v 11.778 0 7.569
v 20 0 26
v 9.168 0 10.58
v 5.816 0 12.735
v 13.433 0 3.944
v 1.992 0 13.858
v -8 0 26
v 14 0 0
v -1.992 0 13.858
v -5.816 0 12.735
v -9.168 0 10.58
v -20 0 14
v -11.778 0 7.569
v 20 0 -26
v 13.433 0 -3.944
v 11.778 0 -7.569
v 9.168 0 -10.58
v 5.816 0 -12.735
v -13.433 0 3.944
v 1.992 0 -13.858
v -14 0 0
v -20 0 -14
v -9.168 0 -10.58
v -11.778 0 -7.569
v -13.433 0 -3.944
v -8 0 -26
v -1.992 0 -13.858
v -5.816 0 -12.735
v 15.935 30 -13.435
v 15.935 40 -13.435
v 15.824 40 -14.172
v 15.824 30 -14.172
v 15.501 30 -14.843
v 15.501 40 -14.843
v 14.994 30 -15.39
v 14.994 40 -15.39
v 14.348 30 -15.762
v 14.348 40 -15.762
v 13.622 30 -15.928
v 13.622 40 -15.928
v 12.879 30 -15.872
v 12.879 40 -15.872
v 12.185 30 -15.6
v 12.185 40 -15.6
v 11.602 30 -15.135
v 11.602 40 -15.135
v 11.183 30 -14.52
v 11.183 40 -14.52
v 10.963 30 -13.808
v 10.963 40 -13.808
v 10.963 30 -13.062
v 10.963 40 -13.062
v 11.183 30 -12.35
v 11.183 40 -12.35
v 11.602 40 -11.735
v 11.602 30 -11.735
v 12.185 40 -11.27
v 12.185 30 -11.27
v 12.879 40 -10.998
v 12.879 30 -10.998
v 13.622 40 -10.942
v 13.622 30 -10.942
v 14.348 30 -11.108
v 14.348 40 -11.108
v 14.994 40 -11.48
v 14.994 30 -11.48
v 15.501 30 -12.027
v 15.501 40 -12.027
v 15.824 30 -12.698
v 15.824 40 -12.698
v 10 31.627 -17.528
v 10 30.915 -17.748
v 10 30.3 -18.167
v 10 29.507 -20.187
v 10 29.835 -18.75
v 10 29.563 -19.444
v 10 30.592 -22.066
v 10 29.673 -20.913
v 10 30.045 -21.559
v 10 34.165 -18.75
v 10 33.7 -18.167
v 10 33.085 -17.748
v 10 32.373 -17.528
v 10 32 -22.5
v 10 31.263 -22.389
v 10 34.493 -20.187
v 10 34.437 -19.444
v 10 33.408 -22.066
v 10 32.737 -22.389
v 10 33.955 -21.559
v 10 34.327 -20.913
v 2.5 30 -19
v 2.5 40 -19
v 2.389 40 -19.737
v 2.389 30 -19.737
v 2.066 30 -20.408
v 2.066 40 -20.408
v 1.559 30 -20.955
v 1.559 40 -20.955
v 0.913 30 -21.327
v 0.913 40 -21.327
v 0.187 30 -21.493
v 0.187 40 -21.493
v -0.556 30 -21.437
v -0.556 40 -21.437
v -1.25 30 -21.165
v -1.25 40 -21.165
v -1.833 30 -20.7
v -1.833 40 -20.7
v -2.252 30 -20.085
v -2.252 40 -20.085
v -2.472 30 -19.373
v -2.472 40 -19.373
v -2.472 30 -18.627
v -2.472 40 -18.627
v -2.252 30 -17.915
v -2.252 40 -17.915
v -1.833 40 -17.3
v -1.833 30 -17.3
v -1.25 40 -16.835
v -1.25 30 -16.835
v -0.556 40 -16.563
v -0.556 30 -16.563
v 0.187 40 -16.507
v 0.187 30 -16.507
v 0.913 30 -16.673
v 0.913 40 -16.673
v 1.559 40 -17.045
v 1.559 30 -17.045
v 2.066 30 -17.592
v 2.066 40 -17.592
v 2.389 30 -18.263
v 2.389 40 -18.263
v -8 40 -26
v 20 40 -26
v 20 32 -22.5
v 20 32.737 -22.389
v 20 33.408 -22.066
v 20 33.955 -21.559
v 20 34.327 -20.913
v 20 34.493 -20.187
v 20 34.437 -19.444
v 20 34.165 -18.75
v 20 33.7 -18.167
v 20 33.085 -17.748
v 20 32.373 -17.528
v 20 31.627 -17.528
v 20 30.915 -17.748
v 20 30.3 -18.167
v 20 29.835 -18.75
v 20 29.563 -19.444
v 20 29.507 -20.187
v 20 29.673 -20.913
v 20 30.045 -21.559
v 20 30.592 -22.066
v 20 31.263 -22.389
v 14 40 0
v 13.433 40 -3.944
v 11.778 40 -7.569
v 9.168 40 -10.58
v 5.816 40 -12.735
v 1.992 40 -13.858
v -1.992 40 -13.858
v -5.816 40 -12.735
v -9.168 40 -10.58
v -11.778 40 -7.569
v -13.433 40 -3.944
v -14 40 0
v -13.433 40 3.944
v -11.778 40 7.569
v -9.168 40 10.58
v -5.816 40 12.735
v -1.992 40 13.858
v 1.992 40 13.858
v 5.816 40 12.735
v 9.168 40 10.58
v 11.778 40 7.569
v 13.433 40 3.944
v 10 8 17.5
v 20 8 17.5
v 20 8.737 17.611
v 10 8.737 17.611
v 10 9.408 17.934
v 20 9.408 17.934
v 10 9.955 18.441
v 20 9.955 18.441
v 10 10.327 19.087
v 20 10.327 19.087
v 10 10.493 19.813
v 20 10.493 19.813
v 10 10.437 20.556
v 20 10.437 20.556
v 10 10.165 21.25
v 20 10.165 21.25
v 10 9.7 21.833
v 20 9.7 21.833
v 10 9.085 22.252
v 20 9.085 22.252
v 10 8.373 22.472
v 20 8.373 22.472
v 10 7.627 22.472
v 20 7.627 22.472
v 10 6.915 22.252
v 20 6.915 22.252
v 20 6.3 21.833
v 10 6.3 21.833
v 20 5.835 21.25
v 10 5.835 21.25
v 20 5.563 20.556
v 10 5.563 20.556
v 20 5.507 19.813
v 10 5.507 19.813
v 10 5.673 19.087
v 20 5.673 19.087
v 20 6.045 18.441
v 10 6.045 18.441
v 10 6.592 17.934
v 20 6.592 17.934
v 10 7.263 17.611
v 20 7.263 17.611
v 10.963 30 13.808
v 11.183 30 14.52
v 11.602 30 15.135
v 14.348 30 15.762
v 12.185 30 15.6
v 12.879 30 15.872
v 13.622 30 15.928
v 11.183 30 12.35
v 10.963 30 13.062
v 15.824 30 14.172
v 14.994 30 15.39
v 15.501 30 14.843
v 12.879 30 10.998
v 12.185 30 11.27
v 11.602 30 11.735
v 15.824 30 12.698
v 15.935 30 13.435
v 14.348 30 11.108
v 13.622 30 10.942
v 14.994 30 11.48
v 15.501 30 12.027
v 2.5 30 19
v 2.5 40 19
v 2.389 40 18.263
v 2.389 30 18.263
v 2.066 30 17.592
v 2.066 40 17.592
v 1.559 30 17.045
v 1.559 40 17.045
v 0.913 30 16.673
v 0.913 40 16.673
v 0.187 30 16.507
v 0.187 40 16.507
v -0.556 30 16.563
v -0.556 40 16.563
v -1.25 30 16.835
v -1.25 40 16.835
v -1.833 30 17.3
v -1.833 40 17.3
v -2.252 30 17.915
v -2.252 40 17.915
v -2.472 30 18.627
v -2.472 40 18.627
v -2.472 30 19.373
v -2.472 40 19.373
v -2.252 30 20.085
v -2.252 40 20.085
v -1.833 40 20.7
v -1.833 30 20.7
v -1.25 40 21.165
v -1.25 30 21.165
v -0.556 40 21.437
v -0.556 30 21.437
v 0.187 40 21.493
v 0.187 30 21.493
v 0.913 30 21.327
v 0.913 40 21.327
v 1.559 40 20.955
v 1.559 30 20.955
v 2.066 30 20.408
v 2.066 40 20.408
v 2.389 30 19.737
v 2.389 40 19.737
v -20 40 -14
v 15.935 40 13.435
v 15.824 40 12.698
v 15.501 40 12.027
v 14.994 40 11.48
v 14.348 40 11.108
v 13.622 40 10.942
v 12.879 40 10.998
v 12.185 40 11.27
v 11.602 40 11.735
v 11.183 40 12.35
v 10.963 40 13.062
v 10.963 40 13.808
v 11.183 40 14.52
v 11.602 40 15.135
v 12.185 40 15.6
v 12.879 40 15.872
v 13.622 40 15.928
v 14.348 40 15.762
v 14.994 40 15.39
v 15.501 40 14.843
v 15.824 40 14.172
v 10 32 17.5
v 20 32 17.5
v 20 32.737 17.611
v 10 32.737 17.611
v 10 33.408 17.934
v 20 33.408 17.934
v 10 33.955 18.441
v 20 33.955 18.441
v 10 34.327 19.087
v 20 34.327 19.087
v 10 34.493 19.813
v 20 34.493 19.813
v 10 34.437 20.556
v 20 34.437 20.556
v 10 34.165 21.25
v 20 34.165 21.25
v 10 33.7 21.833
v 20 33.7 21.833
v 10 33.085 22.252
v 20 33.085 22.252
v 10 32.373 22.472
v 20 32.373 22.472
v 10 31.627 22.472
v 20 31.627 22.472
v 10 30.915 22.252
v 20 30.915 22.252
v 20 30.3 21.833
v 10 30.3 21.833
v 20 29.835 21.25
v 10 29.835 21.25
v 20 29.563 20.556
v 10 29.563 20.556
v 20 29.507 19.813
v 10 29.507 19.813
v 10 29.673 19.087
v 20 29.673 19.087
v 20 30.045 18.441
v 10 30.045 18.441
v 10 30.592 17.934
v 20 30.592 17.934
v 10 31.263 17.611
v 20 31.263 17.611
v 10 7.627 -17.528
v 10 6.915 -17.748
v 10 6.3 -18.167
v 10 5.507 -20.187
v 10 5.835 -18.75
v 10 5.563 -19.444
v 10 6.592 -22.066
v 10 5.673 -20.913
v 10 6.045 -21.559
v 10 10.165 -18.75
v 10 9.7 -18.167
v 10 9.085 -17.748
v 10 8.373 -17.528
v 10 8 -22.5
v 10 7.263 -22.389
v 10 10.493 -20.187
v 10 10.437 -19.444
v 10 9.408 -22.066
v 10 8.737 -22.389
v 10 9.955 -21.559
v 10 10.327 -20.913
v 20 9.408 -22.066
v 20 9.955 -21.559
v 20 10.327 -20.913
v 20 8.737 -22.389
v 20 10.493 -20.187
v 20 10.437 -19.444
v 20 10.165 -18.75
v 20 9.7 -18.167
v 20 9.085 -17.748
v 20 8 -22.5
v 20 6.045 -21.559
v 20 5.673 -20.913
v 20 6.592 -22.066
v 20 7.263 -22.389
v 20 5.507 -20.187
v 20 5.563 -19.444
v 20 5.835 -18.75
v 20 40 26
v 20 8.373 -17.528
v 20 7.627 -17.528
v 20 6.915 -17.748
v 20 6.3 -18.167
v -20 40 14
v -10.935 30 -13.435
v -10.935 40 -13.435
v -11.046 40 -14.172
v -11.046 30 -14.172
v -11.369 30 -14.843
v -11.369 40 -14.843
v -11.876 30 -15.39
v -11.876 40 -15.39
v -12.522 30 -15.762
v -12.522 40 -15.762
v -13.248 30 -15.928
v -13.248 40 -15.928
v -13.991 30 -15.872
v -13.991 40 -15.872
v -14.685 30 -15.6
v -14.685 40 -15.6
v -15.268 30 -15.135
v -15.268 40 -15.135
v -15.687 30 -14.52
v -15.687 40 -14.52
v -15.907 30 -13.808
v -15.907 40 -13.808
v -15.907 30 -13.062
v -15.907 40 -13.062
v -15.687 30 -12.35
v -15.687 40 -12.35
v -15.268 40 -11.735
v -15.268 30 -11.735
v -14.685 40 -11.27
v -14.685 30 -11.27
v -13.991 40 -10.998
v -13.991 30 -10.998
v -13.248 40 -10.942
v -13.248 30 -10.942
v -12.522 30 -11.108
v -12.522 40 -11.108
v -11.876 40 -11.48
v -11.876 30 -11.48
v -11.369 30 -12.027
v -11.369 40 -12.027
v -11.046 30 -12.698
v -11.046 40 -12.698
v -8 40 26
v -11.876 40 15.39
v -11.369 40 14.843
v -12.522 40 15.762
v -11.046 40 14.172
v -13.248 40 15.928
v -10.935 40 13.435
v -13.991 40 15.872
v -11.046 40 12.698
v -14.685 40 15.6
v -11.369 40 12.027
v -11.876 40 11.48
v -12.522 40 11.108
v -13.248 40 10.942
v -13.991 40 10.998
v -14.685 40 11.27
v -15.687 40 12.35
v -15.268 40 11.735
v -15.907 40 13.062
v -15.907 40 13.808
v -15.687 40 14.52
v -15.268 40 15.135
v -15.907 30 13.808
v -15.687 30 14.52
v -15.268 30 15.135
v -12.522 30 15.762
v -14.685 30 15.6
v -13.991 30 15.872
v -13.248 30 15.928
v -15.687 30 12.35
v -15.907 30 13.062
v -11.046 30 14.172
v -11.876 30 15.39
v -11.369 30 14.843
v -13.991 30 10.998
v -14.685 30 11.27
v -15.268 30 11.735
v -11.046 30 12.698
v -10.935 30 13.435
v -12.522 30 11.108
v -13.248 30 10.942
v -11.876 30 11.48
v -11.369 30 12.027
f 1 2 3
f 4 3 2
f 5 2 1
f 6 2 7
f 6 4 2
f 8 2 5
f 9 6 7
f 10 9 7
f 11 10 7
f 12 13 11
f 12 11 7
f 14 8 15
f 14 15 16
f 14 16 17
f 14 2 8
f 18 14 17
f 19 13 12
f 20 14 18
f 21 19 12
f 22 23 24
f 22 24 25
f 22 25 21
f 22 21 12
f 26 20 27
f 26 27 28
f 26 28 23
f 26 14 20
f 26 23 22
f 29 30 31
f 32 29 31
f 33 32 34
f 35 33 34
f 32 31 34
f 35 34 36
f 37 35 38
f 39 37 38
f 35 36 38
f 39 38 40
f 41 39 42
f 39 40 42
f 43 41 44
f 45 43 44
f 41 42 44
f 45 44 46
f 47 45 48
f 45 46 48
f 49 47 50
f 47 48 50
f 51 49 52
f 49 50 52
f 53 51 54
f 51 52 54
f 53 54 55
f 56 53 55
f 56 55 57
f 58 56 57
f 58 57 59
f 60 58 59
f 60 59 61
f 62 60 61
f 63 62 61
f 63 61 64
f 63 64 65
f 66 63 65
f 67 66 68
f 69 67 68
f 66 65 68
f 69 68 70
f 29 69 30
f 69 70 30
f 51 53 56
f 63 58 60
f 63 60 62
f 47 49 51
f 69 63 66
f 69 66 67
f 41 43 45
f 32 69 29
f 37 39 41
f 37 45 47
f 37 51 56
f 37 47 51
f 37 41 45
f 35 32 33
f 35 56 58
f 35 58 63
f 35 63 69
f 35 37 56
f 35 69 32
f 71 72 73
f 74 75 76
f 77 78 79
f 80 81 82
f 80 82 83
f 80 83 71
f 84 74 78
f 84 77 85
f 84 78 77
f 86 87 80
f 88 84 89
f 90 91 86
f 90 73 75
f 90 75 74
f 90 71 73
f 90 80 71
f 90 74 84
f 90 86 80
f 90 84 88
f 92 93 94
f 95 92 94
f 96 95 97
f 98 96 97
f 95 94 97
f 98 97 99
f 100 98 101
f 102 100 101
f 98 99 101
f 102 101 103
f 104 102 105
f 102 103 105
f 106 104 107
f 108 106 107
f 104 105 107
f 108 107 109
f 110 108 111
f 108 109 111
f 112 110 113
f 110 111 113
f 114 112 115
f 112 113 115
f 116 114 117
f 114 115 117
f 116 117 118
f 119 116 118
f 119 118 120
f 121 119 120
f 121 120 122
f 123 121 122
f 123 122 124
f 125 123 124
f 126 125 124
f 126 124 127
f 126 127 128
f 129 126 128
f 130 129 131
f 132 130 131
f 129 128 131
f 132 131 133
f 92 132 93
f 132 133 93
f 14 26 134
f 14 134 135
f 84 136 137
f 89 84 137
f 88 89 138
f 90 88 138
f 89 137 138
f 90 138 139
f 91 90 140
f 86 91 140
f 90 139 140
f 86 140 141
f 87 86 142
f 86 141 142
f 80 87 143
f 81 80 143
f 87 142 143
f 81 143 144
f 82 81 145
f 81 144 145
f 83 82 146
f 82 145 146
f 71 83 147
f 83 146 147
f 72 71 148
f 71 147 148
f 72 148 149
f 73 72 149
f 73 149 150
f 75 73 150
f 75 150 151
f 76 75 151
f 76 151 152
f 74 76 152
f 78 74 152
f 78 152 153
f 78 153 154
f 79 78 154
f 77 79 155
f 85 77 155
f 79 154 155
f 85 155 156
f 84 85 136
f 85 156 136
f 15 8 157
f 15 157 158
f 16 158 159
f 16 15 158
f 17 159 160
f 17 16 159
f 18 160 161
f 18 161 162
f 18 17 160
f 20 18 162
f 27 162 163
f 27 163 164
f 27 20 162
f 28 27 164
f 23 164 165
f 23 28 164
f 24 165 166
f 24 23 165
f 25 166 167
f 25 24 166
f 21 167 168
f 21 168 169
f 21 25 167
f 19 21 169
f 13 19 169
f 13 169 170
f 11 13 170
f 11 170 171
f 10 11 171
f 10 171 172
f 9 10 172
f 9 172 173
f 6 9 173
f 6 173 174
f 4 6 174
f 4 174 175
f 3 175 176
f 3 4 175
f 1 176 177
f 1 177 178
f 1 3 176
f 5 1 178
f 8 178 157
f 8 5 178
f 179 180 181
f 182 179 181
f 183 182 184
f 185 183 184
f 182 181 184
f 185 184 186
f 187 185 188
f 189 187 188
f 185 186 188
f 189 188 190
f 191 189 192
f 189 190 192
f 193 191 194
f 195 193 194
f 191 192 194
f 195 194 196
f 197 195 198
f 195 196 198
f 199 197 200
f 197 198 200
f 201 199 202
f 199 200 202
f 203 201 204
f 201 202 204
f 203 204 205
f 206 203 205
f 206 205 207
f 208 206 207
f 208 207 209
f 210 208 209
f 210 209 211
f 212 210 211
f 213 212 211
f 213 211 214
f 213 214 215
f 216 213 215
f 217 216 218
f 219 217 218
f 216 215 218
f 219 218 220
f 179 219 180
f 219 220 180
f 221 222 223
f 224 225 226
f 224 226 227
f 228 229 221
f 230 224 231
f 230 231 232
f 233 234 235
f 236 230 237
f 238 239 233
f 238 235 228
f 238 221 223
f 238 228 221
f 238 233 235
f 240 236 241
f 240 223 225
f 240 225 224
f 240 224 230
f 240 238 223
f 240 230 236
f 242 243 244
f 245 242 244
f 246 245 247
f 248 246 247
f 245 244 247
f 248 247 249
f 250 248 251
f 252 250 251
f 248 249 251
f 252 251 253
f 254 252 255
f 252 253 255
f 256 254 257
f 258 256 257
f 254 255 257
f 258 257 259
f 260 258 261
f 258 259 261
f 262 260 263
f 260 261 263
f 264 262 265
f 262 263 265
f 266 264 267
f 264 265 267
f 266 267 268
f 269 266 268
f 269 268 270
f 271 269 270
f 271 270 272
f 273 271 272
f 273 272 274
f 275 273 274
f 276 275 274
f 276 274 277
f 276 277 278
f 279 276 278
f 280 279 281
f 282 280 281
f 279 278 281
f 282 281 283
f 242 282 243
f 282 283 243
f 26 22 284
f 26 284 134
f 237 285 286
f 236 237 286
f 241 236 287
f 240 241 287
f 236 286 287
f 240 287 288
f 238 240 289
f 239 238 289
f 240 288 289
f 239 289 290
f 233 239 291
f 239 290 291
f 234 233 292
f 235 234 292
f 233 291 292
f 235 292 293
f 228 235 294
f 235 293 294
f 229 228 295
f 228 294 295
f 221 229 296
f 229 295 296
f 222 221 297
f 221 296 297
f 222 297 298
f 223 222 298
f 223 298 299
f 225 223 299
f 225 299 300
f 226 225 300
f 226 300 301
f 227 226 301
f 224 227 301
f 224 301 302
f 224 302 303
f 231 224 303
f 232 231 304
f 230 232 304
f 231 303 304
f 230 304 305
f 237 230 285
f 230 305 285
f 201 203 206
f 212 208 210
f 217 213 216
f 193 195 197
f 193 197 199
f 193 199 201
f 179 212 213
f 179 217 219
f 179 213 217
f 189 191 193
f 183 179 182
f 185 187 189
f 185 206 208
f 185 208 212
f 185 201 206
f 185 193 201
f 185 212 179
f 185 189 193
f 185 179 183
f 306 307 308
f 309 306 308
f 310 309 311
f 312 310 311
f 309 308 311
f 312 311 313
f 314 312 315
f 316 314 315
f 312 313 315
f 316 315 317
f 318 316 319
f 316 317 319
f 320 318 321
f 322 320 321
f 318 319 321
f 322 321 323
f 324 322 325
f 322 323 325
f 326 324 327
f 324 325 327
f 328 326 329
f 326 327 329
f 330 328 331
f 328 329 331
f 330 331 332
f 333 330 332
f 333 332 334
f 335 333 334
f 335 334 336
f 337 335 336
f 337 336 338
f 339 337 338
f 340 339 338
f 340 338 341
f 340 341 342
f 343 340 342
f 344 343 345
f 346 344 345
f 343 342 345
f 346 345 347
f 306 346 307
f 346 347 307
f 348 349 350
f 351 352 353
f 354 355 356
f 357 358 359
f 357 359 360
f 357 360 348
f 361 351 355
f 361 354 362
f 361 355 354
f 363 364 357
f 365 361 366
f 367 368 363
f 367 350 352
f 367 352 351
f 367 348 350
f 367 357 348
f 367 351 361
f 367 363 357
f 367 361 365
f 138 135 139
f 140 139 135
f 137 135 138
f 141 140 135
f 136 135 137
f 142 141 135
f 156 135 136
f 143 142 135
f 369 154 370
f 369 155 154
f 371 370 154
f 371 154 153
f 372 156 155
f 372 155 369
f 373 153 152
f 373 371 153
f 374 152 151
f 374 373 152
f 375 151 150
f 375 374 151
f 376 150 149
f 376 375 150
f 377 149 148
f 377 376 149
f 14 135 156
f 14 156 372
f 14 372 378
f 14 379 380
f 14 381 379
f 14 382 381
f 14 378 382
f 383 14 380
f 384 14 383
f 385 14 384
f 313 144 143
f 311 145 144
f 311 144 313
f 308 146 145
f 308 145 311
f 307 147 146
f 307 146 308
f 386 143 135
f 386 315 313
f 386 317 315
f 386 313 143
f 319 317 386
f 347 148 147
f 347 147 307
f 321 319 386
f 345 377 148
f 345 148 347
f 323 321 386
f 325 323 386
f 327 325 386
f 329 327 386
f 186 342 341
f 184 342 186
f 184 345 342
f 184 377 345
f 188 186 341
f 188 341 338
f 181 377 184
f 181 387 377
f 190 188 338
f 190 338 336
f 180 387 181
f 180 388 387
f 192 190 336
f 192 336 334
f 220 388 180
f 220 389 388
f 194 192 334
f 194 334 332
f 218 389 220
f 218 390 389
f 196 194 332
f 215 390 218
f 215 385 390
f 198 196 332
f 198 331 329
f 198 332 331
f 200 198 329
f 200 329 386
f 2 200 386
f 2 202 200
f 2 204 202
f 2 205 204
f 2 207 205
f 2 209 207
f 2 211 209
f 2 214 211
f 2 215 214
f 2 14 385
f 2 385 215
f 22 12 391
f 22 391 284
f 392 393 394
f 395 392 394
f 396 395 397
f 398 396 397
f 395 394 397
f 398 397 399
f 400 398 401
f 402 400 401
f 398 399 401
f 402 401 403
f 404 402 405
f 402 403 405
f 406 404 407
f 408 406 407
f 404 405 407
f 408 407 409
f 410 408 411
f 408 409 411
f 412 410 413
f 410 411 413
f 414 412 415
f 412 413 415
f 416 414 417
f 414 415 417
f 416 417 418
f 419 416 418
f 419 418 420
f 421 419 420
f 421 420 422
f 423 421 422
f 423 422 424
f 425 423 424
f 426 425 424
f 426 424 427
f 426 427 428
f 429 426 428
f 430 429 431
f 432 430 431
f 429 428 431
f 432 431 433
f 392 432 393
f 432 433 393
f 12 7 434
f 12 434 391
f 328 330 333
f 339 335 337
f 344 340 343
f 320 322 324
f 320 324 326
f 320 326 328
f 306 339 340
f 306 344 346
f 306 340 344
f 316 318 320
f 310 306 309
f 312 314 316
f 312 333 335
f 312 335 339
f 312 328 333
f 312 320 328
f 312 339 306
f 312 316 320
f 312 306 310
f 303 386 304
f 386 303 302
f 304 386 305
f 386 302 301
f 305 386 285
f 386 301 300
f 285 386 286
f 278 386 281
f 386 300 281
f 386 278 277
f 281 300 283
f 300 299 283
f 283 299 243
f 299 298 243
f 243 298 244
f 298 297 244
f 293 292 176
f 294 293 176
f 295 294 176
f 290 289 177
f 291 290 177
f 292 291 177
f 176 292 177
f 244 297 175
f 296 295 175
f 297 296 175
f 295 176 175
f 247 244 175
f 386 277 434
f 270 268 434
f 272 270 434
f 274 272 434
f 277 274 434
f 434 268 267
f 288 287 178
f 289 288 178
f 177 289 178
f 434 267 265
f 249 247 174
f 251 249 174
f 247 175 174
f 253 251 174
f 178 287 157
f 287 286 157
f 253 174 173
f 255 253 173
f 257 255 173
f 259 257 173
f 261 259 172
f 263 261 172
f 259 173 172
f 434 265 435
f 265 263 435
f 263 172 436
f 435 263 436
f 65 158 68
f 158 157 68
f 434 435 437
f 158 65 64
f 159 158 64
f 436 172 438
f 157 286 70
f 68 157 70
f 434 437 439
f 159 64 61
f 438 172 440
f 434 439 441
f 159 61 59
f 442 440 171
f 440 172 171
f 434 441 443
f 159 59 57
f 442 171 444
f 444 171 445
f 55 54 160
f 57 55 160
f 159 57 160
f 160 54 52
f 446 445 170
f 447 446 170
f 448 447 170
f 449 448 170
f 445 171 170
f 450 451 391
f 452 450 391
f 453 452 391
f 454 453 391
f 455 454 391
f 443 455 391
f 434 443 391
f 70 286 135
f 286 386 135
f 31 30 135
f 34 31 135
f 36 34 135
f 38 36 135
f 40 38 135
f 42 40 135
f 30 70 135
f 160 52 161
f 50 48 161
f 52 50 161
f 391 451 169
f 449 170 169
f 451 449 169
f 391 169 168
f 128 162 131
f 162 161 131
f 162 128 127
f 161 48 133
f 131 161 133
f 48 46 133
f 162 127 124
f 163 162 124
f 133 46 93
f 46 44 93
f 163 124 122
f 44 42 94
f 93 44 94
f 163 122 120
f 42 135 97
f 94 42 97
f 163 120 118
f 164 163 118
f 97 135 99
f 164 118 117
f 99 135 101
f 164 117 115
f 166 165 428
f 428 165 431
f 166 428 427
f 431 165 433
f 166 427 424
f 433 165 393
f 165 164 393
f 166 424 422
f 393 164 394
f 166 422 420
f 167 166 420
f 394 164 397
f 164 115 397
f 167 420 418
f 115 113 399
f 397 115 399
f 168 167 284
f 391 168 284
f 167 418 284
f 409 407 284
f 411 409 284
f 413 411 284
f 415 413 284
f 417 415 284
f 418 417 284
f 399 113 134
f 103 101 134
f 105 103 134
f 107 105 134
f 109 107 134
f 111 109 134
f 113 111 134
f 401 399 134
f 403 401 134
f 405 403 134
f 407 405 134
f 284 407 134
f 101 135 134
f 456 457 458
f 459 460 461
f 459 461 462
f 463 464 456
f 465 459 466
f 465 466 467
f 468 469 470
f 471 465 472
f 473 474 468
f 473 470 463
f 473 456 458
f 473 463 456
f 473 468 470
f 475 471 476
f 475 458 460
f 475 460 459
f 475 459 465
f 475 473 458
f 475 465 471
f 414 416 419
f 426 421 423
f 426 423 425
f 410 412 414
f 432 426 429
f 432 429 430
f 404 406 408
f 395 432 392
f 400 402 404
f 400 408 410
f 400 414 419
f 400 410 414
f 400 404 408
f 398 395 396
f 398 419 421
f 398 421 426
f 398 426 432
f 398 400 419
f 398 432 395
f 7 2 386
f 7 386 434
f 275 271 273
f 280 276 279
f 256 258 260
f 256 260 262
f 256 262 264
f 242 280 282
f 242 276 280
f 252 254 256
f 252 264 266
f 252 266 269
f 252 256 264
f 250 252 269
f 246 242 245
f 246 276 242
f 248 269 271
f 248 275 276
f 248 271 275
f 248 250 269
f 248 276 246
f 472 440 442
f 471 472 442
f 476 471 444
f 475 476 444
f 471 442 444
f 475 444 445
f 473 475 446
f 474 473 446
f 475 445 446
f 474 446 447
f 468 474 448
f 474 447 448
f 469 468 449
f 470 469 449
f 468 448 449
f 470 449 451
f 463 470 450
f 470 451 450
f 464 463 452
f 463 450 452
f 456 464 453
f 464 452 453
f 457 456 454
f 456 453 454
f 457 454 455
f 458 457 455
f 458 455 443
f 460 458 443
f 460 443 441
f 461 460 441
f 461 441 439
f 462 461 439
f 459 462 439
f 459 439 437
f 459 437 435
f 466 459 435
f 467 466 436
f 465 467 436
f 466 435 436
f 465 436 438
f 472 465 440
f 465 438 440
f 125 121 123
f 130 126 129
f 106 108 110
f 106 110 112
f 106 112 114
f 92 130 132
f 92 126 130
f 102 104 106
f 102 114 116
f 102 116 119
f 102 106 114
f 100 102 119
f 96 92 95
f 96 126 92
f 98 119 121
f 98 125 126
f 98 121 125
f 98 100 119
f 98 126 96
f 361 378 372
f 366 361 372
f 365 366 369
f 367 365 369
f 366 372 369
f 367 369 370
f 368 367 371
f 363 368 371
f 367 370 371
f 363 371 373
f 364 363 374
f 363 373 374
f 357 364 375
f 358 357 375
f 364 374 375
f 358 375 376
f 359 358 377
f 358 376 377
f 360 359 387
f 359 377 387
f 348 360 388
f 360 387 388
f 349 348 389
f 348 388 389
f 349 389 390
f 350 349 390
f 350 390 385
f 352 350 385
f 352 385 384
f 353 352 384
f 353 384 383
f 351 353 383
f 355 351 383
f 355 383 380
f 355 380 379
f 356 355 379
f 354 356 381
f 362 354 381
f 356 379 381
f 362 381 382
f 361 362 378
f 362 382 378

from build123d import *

# Parameters (mm, degrees)
SKETCH_1_R          = 14
EXTRUDE_1_DEPTH     = 40
SKETCH_2_R          = 2.5
CUT_EXTRUDE_1_DEPTH = 10
SKETCH_3_R          = 2.5
CUT_EXTRUDE_2_DEPTH = 10


with BuildPart() as part:
    # Эскиз1 → Бобышка-Вытянуть1 (new body)
    with BuildSketch(Plane(origin=(0, 0, 0), x_dir=(1, 0, 0), z_dir=(0, 1, 0))):
        Polygon((-20, 14), (-8, 26), (20, 26), (20, -26), (-8, -26), (-20, -14), align=None)
        Circle(SKETCH_1_R, mode=Mode.SUBTRACT)
    extrude(amount=EXTRUDE_1_DEPTH)

    # Эскиз2 → Вырез-Вытянуть1 (cut)
    with BuildSketch(Plane(origin=(0, 40, 0), x_dir=(1, 0, 0), z_dir=(0, 1, 0))):
        with Locations((0, 19)):
            Circle(SKETCH_2_R)
        with Locations((13.435028843, 13.435028843)):
            Circle(SKETCH_2_R)
        with Locations((13.435028843, -13.435028843)):
            Circle(SKETCH_2_R)
        with Locations((0, -19)):
            Circle(SKETCH_2_R)
        with Locations((-13.435028843, -13.435028843)):
            Circle(SKETCH_2_R)
        with Locations((-13.435028843, 13.435028843)):
            Circle(SKETCH_2_R)
    extrude(amount=-CUT_EXTRUDE_1_DEPTH, mode=Mode.SUBTRACT)

    # Эскиз3 → Вырез-Вытянуть2 (cut)
    with BuildSketch(Plane(origin=(20, 0, 0), x_dir=(0, 0, -1), z_dir=(1, 0, 0))):
        with Locations((-20, 32)):
            Circle(SKETCH_3_R)
        with Locations((20, 32)):
            Circle(SKETCH_3_R)
        with Locations((20, 8)):
            Circle(SKETCH_3_R)
        with Locations((-20, 8)):
            Circle(SKETCH_3_R)
    extrude(amount=-CUT_EXTRUDE_2_DEPTH, mode=Mode.SUBTRACT)


solid = part.part
